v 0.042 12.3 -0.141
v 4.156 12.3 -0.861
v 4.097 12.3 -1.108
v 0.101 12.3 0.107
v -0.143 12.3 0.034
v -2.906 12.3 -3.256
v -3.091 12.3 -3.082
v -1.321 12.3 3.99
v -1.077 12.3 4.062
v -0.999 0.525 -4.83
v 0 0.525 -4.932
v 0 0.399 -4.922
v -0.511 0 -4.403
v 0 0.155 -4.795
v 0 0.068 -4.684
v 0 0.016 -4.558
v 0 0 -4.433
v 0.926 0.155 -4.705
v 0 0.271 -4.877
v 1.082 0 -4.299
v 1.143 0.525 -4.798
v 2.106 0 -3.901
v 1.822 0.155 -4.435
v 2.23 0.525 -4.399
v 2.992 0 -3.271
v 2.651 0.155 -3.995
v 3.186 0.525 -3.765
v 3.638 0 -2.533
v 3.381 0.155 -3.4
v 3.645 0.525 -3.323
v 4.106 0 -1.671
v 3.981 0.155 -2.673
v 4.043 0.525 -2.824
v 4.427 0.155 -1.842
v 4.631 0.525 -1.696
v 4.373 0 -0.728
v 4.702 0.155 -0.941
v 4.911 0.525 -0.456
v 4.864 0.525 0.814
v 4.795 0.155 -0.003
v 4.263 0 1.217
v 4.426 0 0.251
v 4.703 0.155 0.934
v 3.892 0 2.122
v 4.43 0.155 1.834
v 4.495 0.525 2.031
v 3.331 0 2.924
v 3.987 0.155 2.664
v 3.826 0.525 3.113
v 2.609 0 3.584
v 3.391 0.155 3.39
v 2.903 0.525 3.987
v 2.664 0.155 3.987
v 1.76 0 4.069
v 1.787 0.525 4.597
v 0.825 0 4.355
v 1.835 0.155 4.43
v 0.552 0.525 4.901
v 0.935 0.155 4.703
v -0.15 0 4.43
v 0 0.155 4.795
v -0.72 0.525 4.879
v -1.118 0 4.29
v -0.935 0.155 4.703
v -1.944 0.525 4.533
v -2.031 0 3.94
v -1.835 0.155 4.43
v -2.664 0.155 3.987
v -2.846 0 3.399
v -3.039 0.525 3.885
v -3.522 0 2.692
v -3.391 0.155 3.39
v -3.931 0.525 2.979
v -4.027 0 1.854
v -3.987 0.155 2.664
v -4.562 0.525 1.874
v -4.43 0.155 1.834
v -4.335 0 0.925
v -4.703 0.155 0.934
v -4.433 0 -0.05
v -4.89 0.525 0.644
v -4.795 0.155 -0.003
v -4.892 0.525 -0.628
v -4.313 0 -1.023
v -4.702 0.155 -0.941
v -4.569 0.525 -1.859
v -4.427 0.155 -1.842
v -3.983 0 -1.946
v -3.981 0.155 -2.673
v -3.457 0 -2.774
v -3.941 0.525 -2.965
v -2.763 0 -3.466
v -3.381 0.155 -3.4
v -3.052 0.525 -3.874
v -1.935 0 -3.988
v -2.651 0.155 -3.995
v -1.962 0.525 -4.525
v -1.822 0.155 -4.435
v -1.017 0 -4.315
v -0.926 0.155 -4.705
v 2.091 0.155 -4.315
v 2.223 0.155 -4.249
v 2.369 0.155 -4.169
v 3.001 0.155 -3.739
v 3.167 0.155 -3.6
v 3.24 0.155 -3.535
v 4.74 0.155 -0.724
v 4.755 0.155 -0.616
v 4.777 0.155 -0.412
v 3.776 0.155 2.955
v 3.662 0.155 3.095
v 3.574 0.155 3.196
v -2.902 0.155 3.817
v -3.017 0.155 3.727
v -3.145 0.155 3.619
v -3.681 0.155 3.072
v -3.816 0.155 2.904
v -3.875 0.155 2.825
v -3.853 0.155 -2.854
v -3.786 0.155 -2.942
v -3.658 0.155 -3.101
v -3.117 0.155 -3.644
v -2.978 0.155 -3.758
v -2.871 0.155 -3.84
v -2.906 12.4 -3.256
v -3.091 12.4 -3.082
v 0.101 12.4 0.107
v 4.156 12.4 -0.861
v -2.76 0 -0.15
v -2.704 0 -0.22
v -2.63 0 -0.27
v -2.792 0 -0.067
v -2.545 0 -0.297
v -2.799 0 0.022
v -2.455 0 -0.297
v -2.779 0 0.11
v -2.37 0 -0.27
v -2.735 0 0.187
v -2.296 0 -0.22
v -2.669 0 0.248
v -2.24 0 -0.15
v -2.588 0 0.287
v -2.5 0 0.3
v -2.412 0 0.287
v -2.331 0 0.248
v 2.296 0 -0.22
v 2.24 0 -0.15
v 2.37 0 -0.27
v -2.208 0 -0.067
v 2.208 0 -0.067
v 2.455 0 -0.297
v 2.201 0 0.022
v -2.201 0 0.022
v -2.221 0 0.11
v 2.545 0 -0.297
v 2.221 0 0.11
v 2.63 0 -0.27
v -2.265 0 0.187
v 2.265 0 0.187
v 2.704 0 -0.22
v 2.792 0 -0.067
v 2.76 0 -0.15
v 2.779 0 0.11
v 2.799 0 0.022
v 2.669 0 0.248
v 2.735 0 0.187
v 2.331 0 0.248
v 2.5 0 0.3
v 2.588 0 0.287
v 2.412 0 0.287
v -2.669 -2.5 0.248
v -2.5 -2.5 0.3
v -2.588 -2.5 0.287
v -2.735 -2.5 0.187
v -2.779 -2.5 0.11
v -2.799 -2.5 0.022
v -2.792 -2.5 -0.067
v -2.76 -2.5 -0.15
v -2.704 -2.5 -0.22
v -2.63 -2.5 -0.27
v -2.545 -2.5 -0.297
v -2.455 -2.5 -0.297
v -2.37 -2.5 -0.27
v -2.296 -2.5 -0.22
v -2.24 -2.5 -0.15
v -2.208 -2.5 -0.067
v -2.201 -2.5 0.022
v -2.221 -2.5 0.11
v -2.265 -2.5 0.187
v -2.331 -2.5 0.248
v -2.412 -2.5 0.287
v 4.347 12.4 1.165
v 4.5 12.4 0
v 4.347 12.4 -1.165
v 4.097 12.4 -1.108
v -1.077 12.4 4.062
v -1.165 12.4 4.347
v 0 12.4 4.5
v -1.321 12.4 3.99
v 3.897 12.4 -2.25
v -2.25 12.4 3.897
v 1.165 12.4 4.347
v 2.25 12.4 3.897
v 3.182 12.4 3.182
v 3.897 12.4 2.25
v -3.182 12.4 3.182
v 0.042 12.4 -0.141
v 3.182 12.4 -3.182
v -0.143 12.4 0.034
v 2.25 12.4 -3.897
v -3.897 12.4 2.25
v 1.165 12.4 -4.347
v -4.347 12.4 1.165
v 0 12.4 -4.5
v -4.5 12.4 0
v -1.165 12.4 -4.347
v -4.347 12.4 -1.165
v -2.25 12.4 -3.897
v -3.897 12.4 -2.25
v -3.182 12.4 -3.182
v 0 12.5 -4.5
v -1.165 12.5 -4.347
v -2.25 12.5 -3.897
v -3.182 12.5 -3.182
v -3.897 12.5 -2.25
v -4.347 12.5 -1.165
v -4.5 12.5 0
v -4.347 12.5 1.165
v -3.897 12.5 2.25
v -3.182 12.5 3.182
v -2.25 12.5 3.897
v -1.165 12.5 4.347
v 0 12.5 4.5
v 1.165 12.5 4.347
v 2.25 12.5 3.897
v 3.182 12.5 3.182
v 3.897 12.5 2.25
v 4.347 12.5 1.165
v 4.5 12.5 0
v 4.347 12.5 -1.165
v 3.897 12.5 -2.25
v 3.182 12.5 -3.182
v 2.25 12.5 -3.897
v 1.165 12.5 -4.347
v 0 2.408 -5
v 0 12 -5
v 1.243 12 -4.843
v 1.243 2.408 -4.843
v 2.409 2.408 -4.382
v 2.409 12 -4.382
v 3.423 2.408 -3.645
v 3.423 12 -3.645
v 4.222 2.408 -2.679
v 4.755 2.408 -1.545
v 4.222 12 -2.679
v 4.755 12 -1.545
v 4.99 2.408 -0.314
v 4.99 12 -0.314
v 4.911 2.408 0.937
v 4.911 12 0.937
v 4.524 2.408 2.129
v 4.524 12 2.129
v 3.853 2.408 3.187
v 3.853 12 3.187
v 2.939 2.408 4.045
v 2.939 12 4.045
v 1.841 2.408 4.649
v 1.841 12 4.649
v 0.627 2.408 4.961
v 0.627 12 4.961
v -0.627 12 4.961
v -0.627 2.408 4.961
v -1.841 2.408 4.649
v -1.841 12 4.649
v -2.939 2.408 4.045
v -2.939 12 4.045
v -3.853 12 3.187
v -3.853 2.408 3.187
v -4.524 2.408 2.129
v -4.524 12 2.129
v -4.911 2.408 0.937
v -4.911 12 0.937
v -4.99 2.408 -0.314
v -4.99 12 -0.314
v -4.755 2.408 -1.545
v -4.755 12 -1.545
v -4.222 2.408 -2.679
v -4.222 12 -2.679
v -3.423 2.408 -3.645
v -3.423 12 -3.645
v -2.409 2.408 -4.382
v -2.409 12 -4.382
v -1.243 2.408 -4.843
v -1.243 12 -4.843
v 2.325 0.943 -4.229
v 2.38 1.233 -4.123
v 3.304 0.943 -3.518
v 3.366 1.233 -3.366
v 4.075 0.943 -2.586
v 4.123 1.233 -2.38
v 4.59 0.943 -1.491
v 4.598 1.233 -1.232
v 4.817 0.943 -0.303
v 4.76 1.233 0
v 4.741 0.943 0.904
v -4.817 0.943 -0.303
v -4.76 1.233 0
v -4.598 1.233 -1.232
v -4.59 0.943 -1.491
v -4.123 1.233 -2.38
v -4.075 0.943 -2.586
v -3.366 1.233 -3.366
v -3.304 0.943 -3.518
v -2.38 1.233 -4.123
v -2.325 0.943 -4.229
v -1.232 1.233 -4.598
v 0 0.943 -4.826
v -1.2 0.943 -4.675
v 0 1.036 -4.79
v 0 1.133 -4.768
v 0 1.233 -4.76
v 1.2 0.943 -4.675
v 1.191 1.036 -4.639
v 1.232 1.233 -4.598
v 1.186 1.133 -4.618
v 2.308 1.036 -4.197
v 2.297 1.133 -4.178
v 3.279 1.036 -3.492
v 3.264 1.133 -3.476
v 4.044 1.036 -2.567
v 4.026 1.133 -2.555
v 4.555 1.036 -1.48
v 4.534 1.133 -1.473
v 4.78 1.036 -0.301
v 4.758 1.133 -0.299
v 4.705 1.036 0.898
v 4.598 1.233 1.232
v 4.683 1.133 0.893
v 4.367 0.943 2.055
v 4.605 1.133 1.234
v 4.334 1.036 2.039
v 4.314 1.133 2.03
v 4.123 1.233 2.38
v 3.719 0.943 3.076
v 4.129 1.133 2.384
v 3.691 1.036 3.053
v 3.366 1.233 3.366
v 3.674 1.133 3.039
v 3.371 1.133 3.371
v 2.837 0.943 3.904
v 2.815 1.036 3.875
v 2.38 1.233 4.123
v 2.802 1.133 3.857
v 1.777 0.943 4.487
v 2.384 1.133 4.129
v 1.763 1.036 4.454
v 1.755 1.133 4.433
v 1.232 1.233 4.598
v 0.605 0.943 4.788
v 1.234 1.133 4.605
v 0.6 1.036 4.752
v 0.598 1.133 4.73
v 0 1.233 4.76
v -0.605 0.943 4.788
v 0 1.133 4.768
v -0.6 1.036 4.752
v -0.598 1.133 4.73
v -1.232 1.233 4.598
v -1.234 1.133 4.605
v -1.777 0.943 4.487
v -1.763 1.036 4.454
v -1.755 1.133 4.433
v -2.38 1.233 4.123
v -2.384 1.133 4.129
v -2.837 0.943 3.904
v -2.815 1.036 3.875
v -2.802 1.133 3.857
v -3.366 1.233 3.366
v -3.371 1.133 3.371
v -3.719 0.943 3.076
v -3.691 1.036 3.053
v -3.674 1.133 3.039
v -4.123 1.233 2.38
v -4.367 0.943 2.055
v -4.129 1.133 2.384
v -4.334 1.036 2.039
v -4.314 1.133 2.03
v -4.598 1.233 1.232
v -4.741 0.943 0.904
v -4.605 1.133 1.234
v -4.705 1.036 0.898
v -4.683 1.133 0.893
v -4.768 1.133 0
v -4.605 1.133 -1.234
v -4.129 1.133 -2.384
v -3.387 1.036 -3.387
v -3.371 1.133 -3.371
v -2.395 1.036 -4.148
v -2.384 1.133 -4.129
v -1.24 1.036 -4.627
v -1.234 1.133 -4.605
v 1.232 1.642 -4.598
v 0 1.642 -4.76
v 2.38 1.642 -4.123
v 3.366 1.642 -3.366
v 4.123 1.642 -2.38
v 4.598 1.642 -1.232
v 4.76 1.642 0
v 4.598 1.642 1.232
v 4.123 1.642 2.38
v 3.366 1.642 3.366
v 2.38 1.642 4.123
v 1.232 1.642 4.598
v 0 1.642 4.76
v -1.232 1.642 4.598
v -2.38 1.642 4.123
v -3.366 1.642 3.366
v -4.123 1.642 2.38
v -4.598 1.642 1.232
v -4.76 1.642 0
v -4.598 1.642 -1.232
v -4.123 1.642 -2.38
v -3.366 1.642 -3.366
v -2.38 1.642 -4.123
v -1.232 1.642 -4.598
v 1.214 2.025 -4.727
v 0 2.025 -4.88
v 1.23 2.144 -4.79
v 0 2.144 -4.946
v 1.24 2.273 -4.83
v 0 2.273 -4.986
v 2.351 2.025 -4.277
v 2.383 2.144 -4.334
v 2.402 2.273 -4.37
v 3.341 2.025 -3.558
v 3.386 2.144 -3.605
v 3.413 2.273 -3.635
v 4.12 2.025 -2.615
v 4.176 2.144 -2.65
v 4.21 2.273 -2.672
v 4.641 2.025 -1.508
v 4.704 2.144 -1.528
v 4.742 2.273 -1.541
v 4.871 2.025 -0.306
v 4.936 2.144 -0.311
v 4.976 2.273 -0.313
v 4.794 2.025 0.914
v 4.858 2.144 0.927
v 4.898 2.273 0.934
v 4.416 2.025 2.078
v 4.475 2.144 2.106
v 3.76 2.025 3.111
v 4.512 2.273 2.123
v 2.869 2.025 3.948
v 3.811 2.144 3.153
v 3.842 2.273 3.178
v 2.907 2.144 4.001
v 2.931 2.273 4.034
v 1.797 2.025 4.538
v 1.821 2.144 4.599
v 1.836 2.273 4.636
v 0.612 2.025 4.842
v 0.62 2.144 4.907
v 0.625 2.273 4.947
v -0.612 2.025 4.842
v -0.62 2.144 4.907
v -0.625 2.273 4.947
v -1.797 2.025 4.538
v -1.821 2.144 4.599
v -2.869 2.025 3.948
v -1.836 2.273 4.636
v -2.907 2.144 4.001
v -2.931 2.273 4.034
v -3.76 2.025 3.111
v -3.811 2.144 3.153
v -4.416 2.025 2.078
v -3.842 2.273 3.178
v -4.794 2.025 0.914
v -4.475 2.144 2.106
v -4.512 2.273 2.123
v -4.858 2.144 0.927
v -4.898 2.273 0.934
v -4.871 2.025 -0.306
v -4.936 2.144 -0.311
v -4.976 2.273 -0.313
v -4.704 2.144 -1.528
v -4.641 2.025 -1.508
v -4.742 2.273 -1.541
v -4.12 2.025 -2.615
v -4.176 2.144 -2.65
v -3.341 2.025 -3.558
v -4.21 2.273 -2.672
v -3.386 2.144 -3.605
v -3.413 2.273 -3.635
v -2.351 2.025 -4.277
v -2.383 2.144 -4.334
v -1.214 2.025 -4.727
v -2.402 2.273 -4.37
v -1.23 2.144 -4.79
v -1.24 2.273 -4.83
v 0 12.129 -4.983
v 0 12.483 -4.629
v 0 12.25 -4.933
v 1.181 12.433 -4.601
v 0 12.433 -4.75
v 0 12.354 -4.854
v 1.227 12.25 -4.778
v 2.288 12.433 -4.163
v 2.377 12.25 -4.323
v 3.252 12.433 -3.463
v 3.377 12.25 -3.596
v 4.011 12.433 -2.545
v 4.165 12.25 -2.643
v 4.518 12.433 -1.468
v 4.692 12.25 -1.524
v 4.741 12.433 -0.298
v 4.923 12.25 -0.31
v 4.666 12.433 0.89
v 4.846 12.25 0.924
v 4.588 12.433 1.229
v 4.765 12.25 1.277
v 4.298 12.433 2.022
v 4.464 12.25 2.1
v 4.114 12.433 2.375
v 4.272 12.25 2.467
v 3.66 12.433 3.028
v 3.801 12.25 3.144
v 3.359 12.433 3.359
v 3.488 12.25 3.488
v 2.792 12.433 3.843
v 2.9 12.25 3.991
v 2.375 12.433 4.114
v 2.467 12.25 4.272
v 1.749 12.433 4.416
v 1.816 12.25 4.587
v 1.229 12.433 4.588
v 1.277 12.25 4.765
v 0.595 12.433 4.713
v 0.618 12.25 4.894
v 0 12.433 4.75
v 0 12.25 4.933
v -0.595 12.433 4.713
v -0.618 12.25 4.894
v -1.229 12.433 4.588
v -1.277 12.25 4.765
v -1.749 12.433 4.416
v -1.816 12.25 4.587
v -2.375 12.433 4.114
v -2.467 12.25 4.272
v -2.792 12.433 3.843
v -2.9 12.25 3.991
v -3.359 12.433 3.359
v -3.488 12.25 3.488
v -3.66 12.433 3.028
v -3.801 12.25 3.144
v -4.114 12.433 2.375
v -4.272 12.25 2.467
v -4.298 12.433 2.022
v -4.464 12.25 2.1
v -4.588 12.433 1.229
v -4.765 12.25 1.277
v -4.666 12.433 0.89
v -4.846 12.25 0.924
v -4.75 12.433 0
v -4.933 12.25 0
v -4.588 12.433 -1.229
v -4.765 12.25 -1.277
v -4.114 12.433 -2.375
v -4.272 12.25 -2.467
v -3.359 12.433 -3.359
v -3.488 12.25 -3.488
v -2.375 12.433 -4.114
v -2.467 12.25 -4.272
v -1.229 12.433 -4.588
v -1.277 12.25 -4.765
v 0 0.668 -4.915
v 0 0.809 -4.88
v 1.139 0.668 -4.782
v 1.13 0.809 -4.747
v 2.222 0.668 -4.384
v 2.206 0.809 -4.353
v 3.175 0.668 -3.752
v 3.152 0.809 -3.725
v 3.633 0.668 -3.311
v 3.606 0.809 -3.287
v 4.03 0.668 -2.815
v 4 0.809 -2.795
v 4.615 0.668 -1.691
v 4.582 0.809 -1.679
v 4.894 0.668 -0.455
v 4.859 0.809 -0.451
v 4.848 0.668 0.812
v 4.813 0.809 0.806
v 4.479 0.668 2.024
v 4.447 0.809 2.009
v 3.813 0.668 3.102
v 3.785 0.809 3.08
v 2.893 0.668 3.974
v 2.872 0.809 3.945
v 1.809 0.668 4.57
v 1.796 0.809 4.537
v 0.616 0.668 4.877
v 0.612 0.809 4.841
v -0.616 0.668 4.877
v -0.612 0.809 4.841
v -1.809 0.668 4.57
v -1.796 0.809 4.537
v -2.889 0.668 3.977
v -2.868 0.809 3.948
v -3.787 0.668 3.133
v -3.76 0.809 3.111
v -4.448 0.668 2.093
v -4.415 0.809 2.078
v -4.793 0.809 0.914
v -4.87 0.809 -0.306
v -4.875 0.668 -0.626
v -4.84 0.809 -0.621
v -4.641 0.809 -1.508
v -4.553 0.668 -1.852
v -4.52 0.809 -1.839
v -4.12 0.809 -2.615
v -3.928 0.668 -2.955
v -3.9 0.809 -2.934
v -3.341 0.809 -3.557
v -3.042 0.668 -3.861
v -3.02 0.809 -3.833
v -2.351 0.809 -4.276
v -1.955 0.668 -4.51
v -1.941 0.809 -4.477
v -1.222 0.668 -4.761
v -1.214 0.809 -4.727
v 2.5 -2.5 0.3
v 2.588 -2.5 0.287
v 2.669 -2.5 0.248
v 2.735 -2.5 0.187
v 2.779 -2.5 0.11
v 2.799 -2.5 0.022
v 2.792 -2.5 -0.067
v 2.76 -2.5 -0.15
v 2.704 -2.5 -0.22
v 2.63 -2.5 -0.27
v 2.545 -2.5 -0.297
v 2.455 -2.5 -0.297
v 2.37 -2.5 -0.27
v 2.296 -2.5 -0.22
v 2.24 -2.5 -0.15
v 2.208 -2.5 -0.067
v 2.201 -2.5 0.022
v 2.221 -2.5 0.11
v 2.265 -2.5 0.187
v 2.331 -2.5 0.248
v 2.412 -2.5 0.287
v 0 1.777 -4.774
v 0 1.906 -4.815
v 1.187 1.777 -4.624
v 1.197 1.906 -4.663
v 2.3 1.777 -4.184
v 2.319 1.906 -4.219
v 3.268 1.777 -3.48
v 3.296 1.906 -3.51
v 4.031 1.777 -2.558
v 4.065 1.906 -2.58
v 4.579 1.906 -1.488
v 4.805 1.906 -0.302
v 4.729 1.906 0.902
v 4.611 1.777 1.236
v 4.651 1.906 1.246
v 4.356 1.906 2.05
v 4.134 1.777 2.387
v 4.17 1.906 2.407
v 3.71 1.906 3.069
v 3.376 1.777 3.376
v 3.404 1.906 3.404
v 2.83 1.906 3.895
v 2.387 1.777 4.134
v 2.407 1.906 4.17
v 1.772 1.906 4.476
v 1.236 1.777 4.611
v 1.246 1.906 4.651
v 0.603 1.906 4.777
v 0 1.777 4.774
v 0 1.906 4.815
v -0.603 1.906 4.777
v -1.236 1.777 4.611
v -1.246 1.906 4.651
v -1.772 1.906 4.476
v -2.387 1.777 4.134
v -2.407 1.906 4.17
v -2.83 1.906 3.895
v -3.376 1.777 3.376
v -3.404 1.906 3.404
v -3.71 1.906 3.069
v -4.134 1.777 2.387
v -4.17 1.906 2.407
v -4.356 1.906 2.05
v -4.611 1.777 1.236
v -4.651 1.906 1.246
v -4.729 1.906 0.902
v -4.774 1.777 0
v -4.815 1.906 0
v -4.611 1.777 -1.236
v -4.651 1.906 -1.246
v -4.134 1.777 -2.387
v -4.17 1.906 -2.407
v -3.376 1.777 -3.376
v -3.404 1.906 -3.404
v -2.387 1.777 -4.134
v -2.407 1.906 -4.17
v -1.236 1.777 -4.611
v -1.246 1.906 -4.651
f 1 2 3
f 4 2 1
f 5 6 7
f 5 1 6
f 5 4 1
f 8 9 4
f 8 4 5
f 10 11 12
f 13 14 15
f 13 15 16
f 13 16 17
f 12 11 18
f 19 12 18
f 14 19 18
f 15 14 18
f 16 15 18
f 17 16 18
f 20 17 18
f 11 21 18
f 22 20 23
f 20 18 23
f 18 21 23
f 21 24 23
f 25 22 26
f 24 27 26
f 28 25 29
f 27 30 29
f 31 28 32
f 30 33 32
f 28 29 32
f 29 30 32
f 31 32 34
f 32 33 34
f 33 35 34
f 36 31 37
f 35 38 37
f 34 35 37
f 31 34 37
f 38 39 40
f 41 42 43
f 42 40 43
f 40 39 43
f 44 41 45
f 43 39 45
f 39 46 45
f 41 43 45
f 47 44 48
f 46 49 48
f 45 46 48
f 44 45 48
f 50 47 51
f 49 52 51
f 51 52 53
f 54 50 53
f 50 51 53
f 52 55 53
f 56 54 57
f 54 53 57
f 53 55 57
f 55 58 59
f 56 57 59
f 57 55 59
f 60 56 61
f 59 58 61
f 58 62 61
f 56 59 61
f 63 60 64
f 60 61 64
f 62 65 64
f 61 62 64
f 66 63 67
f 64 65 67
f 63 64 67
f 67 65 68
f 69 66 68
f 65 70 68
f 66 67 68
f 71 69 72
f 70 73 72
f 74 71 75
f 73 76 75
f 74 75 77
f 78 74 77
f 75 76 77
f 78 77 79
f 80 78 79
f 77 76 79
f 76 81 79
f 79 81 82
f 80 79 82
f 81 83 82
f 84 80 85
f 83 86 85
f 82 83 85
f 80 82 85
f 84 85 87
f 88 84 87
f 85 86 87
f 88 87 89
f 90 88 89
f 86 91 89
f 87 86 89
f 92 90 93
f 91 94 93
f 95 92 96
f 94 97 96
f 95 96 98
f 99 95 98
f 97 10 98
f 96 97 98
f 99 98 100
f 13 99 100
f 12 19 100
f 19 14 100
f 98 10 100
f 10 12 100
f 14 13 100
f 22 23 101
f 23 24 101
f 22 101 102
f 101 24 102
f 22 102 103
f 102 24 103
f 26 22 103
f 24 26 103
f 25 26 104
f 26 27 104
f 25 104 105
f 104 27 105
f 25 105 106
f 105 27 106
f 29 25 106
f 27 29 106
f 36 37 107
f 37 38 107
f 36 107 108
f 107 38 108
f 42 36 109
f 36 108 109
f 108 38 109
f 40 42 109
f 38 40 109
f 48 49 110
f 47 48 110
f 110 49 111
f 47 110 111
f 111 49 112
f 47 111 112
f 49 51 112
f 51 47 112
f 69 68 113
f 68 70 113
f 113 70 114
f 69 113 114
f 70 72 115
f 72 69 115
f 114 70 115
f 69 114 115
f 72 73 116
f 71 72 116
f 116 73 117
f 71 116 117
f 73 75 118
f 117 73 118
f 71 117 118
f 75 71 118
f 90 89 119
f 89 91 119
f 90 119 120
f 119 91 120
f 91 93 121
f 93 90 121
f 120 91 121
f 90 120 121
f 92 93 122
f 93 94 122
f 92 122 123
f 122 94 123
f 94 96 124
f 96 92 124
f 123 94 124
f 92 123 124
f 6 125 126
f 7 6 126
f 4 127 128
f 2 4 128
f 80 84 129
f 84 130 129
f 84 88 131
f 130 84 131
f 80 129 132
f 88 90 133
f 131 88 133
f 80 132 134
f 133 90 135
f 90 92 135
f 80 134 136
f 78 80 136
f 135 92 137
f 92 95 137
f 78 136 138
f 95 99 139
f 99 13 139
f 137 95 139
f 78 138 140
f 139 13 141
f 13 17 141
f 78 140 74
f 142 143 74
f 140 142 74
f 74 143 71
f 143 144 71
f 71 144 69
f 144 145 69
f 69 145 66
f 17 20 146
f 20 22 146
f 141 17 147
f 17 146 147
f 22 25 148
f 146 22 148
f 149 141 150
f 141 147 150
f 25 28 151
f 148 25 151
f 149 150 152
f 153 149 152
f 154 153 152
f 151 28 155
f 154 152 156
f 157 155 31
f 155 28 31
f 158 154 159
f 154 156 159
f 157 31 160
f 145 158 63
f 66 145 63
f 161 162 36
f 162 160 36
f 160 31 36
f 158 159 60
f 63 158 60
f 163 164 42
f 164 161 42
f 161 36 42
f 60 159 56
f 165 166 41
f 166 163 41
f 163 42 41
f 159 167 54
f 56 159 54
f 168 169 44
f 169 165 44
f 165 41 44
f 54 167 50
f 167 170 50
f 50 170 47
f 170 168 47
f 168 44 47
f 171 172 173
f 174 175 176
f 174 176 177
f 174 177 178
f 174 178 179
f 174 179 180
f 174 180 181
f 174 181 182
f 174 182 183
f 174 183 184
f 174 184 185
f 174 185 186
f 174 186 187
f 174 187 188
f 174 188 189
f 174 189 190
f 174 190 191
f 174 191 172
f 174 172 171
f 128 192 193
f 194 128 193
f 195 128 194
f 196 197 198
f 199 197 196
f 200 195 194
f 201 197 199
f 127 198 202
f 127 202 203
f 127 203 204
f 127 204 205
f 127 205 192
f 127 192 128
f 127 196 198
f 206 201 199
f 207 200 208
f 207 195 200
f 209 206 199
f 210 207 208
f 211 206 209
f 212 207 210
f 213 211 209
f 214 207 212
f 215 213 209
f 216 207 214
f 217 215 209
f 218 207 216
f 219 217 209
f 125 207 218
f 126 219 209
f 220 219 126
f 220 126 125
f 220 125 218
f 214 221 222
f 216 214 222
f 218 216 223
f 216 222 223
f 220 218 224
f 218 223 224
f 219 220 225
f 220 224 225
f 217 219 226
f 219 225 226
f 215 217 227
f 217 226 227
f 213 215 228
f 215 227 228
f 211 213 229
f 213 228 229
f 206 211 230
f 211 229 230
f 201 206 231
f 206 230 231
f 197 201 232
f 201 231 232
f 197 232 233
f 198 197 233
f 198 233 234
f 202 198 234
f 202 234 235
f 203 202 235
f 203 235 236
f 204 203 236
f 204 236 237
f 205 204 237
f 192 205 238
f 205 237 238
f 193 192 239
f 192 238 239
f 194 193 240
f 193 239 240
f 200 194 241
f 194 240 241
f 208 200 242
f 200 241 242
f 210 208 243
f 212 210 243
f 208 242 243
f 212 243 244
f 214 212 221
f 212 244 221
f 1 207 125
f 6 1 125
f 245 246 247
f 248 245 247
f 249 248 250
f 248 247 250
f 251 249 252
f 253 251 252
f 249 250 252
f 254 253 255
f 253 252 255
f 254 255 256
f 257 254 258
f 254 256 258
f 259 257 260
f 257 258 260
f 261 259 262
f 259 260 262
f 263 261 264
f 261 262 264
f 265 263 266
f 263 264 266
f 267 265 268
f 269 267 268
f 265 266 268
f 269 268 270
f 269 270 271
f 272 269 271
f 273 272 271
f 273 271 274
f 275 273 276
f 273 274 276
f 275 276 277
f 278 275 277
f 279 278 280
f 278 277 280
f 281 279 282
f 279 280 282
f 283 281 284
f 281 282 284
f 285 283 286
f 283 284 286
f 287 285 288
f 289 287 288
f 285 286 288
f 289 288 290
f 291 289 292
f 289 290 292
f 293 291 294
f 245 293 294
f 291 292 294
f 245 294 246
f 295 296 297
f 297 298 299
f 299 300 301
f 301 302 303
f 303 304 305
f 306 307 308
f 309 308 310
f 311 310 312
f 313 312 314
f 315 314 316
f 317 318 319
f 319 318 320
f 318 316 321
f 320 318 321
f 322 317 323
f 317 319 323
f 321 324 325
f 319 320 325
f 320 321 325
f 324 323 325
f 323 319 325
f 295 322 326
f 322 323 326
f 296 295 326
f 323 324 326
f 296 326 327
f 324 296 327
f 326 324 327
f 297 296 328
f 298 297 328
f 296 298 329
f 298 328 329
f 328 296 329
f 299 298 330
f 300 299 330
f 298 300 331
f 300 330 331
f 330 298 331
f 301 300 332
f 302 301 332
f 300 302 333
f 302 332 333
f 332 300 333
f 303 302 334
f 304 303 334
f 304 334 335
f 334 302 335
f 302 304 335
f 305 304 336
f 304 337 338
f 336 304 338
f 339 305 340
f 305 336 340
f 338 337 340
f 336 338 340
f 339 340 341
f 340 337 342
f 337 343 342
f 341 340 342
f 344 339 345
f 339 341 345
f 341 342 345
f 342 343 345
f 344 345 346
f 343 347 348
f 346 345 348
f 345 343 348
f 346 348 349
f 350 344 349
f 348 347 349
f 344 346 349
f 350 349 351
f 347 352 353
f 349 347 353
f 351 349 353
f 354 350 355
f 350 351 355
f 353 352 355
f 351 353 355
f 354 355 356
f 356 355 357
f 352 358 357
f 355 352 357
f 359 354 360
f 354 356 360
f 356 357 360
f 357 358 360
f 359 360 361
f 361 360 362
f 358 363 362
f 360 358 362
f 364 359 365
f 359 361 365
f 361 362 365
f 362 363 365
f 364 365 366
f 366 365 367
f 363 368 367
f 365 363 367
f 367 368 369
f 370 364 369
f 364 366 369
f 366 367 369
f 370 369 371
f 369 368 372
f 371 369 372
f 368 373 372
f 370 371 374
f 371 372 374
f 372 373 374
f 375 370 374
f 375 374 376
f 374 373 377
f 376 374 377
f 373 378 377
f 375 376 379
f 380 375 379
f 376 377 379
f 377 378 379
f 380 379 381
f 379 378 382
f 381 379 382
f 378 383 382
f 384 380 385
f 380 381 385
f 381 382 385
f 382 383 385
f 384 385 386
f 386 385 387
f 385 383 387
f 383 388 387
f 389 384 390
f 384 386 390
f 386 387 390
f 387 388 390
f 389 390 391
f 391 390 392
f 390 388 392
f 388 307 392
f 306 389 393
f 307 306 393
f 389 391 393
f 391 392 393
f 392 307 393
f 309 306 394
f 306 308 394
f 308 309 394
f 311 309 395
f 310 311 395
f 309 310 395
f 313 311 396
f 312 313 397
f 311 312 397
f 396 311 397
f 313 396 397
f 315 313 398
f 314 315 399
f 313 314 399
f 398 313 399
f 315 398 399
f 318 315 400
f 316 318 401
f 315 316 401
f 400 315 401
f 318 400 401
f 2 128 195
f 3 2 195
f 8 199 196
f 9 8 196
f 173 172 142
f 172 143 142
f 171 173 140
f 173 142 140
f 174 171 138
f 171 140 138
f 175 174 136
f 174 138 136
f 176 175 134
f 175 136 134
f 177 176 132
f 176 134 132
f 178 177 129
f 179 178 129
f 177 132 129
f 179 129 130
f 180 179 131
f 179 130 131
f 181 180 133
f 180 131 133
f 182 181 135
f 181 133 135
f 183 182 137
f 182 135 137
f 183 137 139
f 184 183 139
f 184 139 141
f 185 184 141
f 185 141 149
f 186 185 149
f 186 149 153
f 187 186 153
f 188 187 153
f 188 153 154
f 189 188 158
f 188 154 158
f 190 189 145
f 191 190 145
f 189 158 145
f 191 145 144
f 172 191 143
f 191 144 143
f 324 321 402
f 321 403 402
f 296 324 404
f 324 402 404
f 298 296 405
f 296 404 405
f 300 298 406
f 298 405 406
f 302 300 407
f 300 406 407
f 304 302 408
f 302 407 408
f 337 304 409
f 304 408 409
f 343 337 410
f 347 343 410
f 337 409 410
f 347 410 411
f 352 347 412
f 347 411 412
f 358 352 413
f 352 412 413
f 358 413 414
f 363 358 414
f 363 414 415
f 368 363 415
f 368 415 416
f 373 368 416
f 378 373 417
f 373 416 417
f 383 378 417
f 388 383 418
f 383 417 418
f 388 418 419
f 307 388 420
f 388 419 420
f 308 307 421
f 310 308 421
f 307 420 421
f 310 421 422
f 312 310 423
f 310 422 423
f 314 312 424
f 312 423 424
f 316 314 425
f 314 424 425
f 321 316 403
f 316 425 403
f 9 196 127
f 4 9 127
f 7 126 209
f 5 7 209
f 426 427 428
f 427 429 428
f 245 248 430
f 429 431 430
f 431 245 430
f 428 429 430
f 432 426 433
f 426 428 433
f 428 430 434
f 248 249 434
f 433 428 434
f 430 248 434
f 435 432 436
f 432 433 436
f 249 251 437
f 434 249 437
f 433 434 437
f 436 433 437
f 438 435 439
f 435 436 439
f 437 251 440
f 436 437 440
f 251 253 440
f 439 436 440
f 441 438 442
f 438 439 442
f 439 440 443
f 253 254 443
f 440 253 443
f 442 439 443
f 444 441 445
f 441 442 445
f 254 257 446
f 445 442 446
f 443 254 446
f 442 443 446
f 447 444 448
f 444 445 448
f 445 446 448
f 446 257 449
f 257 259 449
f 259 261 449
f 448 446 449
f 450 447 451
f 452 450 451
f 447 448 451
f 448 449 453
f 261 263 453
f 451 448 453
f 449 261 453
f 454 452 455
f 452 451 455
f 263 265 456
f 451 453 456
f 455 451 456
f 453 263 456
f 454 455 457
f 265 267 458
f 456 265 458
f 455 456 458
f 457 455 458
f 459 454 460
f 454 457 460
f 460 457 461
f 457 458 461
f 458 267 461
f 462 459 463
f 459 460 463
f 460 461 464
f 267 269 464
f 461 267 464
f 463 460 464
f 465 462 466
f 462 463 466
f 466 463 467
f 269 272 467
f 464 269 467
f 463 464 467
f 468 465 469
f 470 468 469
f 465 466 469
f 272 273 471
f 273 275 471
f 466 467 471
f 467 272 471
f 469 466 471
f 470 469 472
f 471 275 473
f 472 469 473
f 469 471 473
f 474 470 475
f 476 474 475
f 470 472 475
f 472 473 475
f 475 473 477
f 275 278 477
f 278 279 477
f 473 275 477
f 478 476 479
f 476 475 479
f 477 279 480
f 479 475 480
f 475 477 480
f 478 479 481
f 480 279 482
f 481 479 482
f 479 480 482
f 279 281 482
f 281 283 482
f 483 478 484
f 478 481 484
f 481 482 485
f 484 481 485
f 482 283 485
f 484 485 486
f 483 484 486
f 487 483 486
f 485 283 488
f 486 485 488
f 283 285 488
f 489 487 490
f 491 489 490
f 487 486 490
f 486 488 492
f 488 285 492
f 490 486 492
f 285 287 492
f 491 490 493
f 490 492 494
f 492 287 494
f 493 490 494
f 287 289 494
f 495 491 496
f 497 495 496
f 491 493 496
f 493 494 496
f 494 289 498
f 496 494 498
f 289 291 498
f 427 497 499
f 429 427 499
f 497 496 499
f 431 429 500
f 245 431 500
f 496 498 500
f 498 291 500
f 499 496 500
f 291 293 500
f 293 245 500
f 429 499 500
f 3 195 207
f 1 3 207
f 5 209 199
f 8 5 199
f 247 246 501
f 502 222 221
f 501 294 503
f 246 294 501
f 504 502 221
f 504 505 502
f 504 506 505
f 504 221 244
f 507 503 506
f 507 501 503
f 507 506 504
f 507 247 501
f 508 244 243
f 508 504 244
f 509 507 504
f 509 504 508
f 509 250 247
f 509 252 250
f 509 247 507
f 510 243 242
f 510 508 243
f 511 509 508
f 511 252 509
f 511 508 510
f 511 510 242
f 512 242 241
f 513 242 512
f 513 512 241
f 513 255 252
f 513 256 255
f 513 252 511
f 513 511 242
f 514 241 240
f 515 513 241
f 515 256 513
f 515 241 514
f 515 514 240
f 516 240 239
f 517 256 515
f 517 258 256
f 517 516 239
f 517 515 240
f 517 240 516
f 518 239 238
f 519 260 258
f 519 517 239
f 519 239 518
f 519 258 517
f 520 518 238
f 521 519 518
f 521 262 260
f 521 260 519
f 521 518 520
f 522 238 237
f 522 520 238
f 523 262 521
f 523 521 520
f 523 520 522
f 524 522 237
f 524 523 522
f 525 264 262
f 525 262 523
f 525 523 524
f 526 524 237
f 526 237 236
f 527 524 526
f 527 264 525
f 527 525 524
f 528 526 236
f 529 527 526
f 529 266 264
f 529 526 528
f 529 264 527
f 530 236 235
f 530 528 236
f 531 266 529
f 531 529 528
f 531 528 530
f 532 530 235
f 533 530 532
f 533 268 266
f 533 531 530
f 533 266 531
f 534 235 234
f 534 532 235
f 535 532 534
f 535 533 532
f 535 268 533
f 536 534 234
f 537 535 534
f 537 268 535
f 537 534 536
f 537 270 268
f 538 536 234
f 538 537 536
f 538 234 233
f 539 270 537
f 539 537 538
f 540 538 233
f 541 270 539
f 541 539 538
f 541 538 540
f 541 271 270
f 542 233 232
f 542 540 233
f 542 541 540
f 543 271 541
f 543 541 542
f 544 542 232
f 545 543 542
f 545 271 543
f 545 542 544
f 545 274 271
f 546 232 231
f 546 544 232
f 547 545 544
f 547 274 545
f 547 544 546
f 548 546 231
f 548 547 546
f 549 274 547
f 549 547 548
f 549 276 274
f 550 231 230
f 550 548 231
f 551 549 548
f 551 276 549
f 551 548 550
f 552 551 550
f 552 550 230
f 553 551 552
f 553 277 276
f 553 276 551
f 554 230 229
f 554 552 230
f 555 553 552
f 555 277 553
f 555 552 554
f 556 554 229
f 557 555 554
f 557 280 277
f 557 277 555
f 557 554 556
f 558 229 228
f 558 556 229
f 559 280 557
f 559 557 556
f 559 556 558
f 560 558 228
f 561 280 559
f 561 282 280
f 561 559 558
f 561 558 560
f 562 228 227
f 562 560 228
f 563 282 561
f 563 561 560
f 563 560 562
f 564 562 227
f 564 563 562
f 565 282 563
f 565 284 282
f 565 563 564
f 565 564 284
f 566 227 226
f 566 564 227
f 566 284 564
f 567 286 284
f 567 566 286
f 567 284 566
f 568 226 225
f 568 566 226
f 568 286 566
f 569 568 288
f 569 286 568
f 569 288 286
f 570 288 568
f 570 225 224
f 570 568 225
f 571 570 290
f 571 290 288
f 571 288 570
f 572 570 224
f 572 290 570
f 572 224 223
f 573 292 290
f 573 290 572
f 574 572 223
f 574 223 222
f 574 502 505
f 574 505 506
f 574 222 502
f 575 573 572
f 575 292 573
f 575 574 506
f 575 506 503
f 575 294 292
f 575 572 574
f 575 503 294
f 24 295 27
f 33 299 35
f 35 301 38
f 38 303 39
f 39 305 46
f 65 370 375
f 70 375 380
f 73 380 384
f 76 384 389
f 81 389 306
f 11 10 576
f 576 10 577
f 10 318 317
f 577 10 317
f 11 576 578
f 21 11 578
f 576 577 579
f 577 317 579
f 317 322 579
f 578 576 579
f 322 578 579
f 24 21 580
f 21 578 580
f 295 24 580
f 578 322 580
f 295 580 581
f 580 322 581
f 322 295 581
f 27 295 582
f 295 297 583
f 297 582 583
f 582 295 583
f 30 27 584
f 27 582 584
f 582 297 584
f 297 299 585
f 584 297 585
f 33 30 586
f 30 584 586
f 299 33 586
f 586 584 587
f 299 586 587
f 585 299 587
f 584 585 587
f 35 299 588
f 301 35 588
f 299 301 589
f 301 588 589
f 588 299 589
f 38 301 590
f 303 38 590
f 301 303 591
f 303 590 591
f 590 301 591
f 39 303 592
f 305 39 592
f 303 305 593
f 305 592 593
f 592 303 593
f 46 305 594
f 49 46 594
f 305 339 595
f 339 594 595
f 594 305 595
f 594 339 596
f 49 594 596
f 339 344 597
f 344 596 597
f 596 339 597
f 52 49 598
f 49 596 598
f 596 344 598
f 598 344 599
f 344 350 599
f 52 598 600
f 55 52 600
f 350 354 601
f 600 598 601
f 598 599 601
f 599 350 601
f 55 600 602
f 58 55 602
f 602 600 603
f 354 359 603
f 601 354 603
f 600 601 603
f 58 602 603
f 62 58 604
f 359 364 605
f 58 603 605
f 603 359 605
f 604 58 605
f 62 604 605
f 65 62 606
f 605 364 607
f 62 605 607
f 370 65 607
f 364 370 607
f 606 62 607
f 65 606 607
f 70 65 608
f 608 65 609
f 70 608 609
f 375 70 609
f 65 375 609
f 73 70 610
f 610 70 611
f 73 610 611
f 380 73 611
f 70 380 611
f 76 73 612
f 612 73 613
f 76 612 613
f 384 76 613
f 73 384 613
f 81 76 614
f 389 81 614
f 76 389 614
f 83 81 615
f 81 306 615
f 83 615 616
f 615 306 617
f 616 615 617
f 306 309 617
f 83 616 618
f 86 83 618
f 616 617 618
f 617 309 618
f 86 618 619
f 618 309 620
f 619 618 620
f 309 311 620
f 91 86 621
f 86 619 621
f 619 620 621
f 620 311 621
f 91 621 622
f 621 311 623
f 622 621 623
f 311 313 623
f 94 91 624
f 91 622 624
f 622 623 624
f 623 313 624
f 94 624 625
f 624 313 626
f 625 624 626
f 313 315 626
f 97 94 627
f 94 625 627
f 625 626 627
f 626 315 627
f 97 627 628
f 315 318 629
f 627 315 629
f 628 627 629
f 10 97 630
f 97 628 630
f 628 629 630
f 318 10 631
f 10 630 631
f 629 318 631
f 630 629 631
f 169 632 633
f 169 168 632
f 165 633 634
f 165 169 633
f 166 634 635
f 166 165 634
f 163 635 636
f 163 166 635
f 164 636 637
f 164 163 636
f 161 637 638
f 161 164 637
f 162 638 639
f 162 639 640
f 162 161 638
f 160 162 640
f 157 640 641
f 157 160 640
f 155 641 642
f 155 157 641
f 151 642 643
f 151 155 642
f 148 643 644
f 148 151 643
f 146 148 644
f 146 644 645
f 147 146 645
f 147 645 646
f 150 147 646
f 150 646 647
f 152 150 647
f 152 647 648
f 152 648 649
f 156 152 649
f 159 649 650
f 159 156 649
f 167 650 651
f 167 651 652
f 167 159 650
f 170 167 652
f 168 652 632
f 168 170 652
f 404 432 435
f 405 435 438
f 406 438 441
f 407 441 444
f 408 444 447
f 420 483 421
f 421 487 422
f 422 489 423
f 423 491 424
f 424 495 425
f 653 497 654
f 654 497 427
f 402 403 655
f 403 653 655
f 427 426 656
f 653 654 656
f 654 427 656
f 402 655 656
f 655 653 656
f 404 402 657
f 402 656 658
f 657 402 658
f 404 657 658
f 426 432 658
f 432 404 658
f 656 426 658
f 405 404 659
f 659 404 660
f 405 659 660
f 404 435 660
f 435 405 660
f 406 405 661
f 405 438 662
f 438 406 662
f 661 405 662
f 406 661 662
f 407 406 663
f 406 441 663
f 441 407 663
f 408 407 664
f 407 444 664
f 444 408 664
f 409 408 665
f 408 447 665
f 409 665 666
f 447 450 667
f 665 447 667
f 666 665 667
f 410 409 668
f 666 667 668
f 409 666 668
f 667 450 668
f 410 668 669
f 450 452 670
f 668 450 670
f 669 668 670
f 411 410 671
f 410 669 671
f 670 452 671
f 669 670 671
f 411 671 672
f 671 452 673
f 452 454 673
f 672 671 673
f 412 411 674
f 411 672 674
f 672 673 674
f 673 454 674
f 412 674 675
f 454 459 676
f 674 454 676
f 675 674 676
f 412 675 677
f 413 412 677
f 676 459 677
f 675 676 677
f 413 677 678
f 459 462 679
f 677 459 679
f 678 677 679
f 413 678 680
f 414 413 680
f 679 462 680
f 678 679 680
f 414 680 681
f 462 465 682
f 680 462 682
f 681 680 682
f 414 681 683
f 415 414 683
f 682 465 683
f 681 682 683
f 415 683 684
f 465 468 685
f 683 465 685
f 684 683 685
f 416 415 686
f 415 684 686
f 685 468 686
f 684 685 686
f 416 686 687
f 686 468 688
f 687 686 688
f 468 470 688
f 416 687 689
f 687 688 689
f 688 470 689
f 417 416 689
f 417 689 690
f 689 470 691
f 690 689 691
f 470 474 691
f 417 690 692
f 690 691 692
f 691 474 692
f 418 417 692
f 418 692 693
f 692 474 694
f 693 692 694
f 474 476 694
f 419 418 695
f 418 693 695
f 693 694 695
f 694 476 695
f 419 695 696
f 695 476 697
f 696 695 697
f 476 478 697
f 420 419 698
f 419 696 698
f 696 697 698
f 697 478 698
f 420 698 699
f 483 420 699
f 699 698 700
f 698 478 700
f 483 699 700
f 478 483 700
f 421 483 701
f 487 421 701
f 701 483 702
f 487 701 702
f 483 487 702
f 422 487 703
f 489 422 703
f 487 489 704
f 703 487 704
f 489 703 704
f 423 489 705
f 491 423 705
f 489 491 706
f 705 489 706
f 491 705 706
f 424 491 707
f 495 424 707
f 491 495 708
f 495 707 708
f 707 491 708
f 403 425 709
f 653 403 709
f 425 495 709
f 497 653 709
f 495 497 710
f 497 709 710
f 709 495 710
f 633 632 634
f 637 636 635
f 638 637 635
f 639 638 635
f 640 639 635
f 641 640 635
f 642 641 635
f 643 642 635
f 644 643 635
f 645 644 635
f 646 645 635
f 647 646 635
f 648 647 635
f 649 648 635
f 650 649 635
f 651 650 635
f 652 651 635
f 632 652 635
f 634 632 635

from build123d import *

# Parameters (mm, degrees)
SKETCH2_R          = 4.5
CUT_EXTRUDE1_DEPTH = 0.1
CUT_EXTRUDE2_DEPTH = 0.1
SKETCH4_W          = 0.3
SKETCH4_H          = 2.5
FILLET1_R          = 0.5


with BuildPart() as part:
    # Sketch1 → Revolve1 (revolve)
    with BuildSketch(Plane.XY, mode=Mode.PRIVATE) as revolve1_sk:
        with BuildLine():
            Line((5, 12.5), (0, 12.5))
            Line((0, 12.5), (0, 0))
            Line((0, 0), (4.827244523, 0))
            ThreePointArc((4.827244523, 0), (4.933458385, 0.471594976), (4.82617218, 0.942947155))
            ThreePointArc((4.82617218, 0.942947155), (4.777062056, 1.084088077), (4.760416667, 1.232599004))
            Line((4.760416667, 1.232599004), (4.760416667, 1.642400996))
            ThreePointArc((4.760416667, 1.642400996), (4.791064683, 1.842850794), (4.880208333, 2.024984899))
            ThreePointArc((4.880208333, 2.024984899), (4.969351983, 2.207119004), (5, 2.407568802))
            Line((5, 2.407568802), (5, 12.5))
        make_face()
    revolve(revolve1_sk.sketch.rotate(Axis((0, 12.5, 0), (0, -1, 0)), 270), axis=Axis((0, 12.5, 0), (0, -1, 0)))

    # Sketch2 → Cut-Extrude1 (cut)
    with BuildSketch(Plane(origin=(0, 12.5, 0), x_dir=(-1, 0, 0), z_dir=(0, 1, 0))):
        with Locations(Location((0, 0, 0), (0, 0, 270))):
            Circle(SKETCH2_R)
    extrude(amount=-CUT_EXTRUDE1_DEPTH, mode=Mode.SUBTRACT)

    # Sketch3 → Cut-Extrude2 (cut)
    with BuildSketch(Plane(origin=(0, 12.4, 0), x_dir=(-1, 0, 0), z_dir=(0, 1, 0))):
        Polygon((2.906036622, -3.256093686), (3.090537324, -3.081521376), (0.142645036, 0.03402539), (1.320649975, 3.989641976), (1.07721557, 4.062138116), (-0.10078937, 0.10652153), (-4.155587963, -0.860677244), (-4.096654259, -1.107745693), (-0.041855666, -0.14054692), align=None)
    extrude(amount=-CUT_EXTRUDE2_DEPTH, mode=Mode.SUBTRACT)

    # Sketch4 → Revolve2 (revolve)
    with BuildSketch(Plane(origin=(0, 0, 0), x_dir=(-1, 0, 0), z_dir=(0, 0, -1)), mode=Mode.PRIVATE) as revolve2_sk:
        with Locations((-2.65, -1.25)):
            Rectangle(SKETCH4_W, SKETCH4_H)
    revolve2 = revolve(revolve2_sk.sketch.rotate(Axis((2.5, -2.5, 0), (0, 1, 0)), 270), axis=Axis((2.5, -2.5, 0), (0, 1, 0)))

    # Fillet1
    fillet1_edges = [part.edges().sort_by_distance(p)[0] for p in [
        (0, 12.5, 5),
        (0, 0, 4.827244523),
    ]]
    fillet(fillet1_edges, radius=FILLET1_R - 0.0001)  # a hair under: the kernel refuses the full size

    # Simetría3: Revolve2 across plane
    add(revolve2.mirror(Plane(origin=(0, 0, 0), x_dir=(0, 0, 1), z_dir=(1, 0, 0))))


solid = part.part
